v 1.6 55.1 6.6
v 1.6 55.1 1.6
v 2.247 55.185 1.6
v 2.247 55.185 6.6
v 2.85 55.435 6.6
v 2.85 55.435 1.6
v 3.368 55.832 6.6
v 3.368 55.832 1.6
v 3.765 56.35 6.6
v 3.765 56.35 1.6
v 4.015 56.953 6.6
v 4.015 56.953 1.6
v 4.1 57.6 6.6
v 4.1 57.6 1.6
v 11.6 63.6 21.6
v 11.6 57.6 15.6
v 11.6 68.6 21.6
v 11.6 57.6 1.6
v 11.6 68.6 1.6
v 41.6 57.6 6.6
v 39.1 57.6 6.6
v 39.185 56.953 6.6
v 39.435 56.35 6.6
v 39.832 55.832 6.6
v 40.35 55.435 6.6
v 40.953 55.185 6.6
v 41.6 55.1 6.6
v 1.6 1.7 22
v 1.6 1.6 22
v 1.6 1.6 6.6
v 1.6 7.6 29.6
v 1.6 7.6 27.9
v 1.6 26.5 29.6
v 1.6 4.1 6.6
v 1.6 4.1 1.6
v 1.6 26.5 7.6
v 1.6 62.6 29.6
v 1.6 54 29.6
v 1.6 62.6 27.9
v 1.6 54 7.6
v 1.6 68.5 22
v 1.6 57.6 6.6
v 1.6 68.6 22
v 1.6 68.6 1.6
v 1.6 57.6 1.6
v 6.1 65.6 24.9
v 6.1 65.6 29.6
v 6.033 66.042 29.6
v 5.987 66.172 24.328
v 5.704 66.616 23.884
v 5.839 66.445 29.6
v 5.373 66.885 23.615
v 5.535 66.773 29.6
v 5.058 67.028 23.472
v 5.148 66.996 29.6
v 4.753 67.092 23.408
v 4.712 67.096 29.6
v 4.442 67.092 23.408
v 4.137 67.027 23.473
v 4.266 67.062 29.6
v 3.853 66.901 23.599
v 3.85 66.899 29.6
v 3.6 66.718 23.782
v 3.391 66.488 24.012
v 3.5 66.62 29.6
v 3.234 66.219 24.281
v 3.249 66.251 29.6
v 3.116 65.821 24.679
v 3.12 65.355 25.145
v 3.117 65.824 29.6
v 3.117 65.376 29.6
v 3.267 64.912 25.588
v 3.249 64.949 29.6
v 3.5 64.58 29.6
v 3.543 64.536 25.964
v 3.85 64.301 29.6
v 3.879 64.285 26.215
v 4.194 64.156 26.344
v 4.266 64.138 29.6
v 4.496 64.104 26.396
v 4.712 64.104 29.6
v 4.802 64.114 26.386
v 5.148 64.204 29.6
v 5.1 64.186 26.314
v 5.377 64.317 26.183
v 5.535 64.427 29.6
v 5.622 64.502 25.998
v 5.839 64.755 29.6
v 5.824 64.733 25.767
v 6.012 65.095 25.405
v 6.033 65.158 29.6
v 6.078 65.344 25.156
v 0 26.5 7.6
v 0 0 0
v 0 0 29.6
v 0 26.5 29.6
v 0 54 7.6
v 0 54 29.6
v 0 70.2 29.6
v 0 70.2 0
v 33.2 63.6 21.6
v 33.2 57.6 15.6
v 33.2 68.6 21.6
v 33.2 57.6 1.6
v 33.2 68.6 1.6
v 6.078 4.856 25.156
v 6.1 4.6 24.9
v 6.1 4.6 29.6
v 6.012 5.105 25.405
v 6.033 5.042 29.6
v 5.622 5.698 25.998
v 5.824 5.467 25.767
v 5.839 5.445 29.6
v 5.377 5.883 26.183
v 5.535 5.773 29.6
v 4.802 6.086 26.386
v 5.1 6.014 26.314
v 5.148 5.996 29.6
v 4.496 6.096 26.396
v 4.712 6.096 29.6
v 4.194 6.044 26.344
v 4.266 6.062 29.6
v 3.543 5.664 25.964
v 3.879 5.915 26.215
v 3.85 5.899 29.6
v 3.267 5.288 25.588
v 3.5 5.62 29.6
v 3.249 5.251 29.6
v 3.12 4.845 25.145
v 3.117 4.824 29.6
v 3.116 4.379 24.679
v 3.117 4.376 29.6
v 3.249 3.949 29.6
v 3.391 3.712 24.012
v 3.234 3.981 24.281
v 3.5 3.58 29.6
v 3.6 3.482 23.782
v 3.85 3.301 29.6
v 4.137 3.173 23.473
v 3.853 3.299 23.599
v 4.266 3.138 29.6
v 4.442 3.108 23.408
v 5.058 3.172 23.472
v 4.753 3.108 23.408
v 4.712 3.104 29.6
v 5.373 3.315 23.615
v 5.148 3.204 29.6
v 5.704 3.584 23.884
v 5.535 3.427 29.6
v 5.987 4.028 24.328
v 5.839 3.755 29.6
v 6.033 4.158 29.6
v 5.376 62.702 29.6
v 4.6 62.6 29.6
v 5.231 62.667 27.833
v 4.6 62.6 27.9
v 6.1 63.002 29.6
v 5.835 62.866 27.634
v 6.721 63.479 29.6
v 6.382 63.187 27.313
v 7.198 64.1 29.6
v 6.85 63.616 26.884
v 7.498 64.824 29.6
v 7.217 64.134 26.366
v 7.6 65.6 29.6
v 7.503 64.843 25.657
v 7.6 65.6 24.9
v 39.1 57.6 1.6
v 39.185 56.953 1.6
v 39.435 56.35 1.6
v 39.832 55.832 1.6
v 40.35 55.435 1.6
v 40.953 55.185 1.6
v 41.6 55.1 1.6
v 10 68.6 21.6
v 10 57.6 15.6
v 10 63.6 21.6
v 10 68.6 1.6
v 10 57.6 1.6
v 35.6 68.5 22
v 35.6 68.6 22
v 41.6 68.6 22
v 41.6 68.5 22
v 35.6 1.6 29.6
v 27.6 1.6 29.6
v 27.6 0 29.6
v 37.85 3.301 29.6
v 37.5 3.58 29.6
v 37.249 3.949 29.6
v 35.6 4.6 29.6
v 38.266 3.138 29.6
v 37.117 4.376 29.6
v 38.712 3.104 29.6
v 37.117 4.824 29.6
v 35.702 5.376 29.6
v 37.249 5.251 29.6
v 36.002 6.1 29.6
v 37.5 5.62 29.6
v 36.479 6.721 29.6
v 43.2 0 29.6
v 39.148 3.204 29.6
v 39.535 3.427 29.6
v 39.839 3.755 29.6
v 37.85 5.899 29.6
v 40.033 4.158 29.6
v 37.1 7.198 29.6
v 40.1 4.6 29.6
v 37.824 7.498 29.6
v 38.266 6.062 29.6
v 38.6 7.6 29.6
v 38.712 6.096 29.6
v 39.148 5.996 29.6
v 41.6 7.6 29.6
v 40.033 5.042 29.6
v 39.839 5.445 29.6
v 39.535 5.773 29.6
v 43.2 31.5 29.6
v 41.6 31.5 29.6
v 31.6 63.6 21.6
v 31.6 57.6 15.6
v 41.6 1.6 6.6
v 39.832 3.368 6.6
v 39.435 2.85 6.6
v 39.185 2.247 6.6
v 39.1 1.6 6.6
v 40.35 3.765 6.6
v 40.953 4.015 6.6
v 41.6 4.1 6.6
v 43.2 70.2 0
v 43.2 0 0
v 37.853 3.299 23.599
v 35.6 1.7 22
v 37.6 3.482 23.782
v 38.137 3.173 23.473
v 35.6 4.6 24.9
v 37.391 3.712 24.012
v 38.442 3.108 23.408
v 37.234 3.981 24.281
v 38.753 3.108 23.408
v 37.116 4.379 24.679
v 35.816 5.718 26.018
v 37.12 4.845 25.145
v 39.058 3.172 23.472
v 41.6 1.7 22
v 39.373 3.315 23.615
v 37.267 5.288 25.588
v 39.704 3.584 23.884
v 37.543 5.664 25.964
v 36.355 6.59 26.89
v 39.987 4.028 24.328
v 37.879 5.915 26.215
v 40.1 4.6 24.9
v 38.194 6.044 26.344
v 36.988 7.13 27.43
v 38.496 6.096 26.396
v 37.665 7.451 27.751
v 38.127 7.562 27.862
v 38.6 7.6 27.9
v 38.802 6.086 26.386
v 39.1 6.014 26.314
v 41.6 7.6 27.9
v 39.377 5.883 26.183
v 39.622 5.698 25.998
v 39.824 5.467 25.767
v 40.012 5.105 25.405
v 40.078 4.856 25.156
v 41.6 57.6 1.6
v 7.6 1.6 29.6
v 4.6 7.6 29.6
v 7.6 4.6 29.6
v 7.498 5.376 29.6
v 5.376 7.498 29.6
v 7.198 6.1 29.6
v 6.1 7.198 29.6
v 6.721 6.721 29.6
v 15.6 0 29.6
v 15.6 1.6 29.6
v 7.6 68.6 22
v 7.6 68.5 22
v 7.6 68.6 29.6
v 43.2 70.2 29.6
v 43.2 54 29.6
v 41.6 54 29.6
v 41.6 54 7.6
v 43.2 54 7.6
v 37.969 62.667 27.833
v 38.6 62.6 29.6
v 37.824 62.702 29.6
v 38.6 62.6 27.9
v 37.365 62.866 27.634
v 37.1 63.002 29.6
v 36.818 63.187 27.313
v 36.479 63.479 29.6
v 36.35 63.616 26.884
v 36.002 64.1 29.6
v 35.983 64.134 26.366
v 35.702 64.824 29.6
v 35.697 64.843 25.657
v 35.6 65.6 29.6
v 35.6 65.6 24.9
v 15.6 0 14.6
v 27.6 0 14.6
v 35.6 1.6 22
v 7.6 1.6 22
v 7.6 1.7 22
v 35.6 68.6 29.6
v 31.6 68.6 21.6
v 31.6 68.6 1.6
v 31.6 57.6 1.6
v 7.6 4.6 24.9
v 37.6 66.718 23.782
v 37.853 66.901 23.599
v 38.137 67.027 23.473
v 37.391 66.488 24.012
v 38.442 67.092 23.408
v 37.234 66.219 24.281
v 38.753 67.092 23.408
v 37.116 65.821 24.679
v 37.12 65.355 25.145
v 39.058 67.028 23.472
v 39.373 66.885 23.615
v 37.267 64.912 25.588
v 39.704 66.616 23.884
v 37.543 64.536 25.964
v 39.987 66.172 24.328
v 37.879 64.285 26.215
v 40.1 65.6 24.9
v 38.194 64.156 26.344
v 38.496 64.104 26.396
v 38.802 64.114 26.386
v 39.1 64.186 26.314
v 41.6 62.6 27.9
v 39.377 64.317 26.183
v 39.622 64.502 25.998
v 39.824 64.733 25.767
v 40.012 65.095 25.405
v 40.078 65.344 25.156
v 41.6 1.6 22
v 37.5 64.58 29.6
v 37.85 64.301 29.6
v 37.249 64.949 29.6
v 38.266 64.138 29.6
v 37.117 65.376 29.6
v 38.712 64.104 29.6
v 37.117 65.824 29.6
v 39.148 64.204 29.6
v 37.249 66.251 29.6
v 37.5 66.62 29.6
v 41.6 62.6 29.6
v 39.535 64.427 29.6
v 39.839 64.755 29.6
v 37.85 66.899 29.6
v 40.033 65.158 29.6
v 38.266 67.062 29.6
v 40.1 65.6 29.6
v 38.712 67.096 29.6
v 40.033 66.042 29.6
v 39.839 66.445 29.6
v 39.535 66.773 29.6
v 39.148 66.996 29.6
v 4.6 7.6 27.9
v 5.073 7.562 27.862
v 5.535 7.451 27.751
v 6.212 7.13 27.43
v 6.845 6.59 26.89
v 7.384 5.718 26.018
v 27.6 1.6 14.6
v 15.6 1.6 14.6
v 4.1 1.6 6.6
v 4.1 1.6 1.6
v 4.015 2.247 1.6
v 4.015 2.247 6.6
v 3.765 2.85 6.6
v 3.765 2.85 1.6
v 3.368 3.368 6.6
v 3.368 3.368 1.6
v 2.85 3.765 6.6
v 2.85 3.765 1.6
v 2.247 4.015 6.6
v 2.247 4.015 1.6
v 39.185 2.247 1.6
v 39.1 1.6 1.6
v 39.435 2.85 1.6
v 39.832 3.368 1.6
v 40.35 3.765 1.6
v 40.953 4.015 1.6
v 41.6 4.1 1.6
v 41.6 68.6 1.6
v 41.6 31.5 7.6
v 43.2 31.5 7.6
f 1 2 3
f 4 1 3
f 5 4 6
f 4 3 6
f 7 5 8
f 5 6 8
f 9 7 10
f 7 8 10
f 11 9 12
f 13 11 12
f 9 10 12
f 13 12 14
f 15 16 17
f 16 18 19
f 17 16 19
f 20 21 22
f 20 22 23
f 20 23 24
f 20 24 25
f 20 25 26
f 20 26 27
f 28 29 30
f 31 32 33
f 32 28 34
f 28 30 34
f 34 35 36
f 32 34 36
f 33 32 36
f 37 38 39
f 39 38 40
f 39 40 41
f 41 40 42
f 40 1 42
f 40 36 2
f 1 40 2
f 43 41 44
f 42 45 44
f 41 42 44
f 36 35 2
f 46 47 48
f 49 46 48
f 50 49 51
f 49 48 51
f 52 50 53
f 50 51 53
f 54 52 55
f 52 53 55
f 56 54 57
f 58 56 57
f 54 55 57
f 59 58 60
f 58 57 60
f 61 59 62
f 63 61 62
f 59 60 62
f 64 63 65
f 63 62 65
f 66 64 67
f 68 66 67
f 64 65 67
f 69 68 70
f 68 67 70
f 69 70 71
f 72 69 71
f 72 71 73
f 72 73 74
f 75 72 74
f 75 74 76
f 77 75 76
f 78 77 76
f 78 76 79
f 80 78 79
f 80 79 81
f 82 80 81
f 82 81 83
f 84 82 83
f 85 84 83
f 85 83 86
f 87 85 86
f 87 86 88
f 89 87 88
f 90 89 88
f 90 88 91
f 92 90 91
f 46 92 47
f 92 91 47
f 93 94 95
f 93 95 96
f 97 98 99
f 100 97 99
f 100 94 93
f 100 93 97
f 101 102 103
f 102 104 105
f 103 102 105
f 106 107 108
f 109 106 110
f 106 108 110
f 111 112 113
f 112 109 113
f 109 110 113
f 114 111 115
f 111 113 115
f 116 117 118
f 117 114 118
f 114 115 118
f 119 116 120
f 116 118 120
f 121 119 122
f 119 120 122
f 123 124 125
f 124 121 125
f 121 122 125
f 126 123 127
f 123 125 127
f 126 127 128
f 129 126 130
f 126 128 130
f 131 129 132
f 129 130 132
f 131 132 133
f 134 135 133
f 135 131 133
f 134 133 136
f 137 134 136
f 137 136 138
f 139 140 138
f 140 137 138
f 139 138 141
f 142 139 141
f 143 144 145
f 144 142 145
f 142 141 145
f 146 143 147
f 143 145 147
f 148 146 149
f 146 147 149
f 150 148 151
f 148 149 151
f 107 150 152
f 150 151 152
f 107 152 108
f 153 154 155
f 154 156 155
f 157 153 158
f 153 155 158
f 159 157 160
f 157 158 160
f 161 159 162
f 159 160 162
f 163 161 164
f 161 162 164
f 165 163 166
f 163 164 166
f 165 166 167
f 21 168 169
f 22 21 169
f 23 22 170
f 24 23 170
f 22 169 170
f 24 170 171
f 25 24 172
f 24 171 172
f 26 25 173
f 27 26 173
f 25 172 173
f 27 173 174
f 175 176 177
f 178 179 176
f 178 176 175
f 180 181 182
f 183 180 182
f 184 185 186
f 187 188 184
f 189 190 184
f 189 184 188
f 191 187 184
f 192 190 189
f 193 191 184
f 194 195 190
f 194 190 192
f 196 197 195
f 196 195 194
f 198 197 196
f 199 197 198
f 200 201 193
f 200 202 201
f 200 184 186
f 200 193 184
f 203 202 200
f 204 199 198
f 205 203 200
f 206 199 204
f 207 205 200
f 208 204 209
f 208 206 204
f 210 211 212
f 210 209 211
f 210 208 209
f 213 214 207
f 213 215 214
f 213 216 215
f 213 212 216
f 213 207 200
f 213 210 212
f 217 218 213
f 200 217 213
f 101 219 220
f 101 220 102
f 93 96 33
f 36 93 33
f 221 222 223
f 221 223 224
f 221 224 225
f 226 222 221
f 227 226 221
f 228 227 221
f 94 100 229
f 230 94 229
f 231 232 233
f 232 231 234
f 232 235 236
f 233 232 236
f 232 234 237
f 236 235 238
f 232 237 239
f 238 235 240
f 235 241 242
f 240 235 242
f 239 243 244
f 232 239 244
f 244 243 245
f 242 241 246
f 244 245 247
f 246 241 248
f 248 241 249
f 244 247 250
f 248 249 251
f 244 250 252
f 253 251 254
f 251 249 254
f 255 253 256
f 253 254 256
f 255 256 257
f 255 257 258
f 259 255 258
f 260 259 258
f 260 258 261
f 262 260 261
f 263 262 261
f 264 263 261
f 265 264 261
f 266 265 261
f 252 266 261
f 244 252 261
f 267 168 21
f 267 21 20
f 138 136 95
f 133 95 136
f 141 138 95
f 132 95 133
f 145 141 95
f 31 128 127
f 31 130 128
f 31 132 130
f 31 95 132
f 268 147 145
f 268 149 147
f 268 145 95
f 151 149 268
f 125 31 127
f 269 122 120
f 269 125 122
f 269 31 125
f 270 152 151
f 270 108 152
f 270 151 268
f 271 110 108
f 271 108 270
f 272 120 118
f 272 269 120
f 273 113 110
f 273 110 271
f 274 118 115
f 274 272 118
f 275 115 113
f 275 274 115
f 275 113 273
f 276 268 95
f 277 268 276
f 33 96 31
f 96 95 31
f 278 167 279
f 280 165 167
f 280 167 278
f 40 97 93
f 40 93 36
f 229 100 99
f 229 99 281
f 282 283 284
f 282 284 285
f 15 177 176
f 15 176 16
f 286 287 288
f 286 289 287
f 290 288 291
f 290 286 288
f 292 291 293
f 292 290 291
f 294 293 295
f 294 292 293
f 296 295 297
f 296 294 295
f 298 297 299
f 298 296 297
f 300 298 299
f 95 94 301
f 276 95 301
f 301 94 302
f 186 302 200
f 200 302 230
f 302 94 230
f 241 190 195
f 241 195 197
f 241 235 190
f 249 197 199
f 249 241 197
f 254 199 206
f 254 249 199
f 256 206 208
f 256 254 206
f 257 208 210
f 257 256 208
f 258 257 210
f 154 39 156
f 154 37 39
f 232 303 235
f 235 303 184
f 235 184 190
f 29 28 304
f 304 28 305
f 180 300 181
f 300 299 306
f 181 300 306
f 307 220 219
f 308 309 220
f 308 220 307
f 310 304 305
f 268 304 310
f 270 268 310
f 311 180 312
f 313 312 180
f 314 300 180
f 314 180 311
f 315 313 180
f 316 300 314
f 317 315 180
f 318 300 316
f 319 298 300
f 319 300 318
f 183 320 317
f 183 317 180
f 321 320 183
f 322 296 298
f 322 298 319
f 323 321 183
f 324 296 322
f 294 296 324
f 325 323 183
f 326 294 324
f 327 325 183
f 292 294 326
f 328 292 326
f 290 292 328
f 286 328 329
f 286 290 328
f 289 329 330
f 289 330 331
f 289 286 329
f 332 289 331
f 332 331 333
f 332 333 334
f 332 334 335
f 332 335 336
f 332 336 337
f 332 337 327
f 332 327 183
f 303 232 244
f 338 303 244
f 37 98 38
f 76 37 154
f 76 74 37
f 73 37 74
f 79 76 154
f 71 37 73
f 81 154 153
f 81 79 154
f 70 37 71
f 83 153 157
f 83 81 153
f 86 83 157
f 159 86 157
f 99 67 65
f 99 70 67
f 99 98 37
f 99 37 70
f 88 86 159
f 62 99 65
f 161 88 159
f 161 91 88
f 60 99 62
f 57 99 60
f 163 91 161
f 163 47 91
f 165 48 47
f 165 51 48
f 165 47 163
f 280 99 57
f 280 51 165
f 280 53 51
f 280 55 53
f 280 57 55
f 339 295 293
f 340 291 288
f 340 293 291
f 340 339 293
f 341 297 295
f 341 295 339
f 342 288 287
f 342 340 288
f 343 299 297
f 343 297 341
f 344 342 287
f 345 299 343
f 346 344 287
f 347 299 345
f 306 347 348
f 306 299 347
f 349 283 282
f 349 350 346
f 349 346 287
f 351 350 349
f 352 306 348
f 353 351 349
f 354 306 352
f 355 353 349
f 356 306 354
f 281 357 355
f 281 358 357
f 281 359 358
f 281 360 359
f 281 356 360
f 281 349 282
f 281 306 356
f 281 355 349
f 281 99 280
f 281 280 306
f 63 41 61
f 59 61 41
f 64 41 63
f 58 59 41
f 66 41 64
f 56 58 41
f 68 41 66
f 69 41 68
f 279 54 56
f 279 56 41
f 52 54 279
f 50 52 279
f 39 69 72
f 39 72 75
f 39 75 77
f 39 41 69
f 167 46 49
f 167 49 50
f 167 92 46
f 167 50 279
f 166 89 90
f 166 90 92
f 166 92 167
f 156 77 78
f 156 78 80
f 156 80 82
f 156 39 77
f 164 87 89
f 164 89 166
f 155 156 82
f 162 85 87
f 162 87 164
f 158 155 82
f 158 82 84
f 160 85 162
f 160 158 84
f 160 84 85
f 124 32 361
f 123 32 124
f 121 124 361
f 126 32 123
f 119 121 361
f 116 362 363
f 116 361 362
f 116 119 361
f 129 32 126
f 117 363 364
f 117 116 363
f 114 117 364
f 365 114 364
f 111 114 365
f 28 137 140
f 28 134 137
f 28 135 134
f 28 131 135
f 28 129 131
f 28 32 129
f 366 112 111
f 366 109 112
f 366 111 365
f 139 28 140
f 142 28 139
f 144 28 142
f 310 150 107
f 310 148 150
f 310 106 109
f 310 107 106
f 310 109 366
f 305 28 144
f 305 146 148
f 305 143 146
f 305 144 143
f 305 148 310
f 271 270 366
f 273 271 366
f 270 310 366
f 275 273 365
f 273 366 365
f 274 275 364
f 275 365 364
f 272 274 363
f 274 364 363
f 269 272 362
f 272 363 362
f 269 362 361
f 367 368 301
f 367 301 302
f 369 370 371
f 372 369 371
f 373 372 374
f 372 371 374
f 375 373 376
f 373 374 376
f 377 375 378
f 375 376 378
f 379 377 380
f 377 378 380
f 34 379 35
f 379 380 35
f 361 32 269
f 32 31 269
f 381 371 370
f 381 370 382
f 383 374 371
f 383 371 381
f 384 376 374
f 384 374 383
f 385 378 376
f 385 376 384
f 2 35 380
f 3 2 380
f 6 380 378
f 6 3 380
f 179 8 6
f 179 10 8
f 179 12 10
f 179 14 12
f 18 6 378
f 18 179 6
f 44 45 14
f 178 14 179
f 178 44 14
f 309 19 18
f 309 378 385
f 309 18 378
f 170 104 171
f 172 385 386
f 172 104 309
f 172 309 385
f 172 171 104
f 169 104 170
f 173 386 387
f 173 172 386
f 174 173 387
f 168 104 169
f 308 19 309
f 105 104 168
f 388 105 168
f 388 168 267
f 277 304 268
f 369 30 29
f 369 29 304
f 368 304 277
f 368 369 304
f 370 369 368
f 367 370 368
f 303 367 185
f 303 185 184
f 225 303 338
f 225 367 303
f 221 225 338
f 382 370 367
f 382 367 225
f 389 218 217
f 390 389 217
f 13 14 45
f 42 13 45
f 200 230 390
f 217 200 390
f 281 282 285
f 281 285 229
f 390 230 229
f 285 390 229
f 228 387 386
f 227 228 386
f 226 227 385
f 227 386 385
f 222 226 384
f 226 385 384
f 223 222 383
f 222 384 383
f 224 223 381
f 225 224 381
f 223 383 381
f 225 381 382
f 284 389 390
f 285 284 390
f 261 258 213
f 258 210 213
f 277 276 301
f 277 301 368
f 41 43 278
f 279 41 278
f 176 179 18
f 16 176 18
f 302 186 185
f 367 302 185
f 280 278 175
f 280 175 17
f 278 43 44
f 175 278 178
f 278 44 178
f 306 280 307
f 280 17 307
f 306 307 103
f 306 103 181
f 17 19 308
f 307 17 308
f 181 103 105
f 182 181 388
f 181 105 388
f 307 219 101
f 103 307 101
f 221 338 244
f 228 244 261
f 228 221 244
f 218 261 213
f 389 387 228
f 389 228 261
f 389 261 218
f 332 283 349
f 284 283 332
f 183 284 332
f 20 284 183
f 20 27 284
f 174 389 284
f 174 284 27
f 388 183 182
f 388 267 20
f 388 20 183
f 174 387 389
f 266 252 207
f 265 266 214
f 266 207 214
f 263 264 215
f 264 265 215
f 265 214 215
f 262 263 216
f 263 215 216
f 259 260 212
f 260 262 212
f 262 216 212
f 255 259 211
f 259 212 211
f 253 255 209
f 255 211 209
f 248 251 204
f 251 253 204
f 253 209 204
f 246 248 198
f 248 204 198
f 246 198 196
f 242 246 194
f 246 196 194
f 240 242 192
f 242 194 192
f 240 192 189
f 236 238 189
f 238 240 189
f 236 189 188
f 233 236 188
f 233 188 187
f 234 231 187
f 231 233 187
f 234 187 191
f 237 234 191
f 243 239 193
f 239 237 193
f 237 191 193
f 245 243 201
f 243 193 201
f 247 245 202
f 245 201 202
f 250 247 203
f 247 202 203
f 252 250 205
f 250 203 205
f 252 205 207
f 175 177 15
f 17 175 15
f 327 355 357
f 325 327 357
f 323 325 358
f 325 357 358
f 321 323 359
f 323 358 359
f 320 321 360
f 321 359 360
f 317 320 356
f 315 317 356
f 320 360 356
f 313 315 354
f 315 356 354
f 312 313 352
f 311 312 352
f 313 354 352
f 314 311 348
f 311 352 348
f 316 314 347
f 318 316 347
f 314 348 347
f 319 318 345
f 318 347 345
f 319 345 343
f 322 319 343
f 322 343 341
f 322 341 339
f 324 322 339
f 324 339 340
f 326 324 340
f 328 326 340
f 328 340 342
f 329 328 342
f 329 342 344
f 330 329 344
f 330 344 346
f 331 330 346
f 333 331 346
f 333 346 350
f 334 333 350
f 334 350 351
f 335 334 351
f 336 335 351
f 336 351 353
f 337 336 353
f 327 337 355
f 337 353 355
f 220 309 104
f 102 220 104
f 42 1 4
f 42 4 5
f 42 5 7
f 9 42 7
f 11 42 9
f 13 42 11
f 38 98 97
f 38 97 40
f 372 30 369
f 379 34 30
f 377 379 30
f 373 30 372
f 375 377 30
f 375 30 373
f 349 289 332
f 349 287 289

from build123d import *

# Parameters (mm, degrees)
SKETCH_W        = 43.2
SKETCH_H        = 70.2
PAD_DEPTH       = 1.6
SKETCH001_W     = 43.2
SKETCH001_H     = 70.2
SKETCH001_W_2   = 40
SKETCH001_H_2   = 67
PAD001_DEPTH    = 28
PAD002_DEPTH    = 5
SKETCH003_W     = 1.6
SKETCH003_H     = 27.5
SKETCH003_H_2   = 22.5
POCKET_DEPTH    = 22
SKETCH004_W     = 1.6
SKETCH004_H     = 11
PAD003_DEPTH    = 20
SKETCH005_W     = 12
SKETCH005_H     = 1.6
POCKET001_DEPTH = 15
SKETCH006_W     = 6
SKETCH006_H     = 6
PAD004_DEPTH    = 7.6
CHAMFER_SIZE    = 5.9
SKETCH007_R     = 1.5
POCKET002_DEPTH = 10
FILLET_R        = 3
CHAMFER001_SIZE = 6


with BuildPart() as part:
    # Sketch → Pad (new body)
    with BuildSketch(Plane.XY):
        with Locations((21.6, 35.1)):
            Rectangle(SKETCH_W, SKETCH_H)
    extrude(amount=PAD_DEPTH)

    # Sketch001 (on Face6 of Pad) → Pad001 (join)
    with BuildSketch(Plane.XY.offset(1.6)):
        with Locations((21.6, 35.1)):
            Rectangle(SKETCH001_W, SKETCH001_H)
        with Locations((21.6, 35.1)):
            Rectangle(SKETCH001_W_2, SKETCH001_H_2, mode=Mode.SUBTRACT)
    extrude(amount=PAD001_DEPTH)

    # Sketch002 (on Face15 of Pad001) → Pad002 (join)
    with BuildSketch(Plane.XY.offset(1.6)):
        with BuildLine():
            ThreePointArc((4.1, 1.6), (3.367767, 3.367767), (1.6, 4.1))
            Line((1.6, 4.1), (1.6, 1.6))
            Line((4.1, 1.6), (1.6, 1.6))
        make_face()
        with BuildLine():
            ThreePointArc((41.6, 4.1), (39.832233, 3.367767), (39.1, 1.6))
            Line((41.6, 1.6), (39.1, 1.6))
            Line((41.6, 4.1), (41.6, 1.6))
        make_face()
        with BuildLine():
            ThreePointArc((1.6, 55.1), (3.367767, 55.832233), (4.1, 57.6))
            Line((4.1, 57.6), (1.6, 57.6))
            Line((1.6, 55.1), (1.6, 57.6))
        make_face()
        with BuildLine():
            ThreePointArc((39.1, 57.6), (39.832233, 55.832233), (41.6, 55.1))
            Line((41.6, 55.1), (41.6, 57.6))
            Line((39.1, 57.6), (41.6, 57.6))
        make_face()
    extrude(amount=PAD002_DEPTH)

    # Sketch003 (on Face9 of Pad002) → Pocket (cut)
    with BuildSketch(Plane.XY.offset(29.6)):
        with Locations((0.8, 40.25)):
            Rectangle(SKETCH003_W, SKETCH003_H)
        with Locations((42.4, 42.75)):
            Rectangle(SKETCH003_W, SKETCH003_H_2)
    extrude(amount=-POCKET_DEPTH, mode=Mode.SUBTRACT)

    # Sketch004 (on Face22 of Pocket) → Pad003 (join)
    with BuildSketch(Plane.XY.offset(1.6)):
        with Locations((10.8, 63.1)):
            Rectangle(SKETCH004_W, SKETCH004_H)
        with Locations((32.4, 63.1)):
            Rectangle(SKETCH004_W, SKETCH004_H)
    extrude(amount=PAD003_DEPTH)

    # Sketch005 (on Face9 of Pad003) → Pocket001 (cut)
    with BuildSketch(Plane.XY.offset(29.6)):
        with Locations((21.6, 0.8)):
            Rectangle(SKETCH005_W, SKETCH005_H)
    extrude(amount=-POCKET001_DEPTH, mode=Mode.SUBTRACT)

    # Sketch006 (on Face13 of Pocket001) → Pad004 (join)
    with BuildSketch(Plane.XY.offset(29.6)):
        with Locations((4.6, 4.6)):
            Rectangle(SKETCH006_W, SKETCH006_H)
        with Locations((38.6, 4.6)):
            Rectangle(SKETCH006_W, SKETCH006_H)
        with Locations((4.6, 65.6)):
            Rectangle(SKETCH006_W, SKETCH006_H)
        with Locations((38.6, 65.6)):
            Rectangle(SKETCH006_W, SKETCH006_H)
    extrude(amount=-PAD004_DEPTH)

    # Chamfer
    chamfer_edges = [part.edges().sort_by_distance(p)[0] for p in [
        (38.6, 62.6, 22),
        (4.6, 62.6, 22),
        (38.6, 7.6, 22),
        (4.6, 7.6, 22),
    ]]
    chamfer(chamfer_edges, length=CHAMFER_SIZE)

    # Sketch007 → Pocket002 (cut)
    with BuildSketch(Plane.XY.offset(29.6)):
        with Locations((4.6, 4.6)):
            Circle(SKETCH007_R)
        with Locations((38.6, 4.6)):
            Circle(SKETCH007_R)
        with Locations((4.6, 65.6)):
            Circle(SKETCH007_R)
        with Locations((38.6, 65.6)):
            Circle(SKETCH007_R)
    extrude(amount=-POCKET002_DEPTH, mode=Mode.SUBTRACT)

    # Fillet
    fillet_edges = [part.edges().sort_by_distance(p)[0] for p in [
        (7.6, 62.6, 28.75),
        (35.6, 62.6, 28.75),
        (7.6, 7.6, 28.75),
        (35.6, 7.6, 28.75),
    ]]
    fillet(fillet_edges, radius=FILLET_R)

    # Chamfer001
    chamfer001_edges = [part.edges().sort_by_distance(p)[0] for p in [
        (10.8, 57.6, 21.6),
        (32.4, 57.6, 21.6),
    ]]
    chamfer(chamfer001_edges, length=CHAMFER001_SIZE)


solid = part.part
